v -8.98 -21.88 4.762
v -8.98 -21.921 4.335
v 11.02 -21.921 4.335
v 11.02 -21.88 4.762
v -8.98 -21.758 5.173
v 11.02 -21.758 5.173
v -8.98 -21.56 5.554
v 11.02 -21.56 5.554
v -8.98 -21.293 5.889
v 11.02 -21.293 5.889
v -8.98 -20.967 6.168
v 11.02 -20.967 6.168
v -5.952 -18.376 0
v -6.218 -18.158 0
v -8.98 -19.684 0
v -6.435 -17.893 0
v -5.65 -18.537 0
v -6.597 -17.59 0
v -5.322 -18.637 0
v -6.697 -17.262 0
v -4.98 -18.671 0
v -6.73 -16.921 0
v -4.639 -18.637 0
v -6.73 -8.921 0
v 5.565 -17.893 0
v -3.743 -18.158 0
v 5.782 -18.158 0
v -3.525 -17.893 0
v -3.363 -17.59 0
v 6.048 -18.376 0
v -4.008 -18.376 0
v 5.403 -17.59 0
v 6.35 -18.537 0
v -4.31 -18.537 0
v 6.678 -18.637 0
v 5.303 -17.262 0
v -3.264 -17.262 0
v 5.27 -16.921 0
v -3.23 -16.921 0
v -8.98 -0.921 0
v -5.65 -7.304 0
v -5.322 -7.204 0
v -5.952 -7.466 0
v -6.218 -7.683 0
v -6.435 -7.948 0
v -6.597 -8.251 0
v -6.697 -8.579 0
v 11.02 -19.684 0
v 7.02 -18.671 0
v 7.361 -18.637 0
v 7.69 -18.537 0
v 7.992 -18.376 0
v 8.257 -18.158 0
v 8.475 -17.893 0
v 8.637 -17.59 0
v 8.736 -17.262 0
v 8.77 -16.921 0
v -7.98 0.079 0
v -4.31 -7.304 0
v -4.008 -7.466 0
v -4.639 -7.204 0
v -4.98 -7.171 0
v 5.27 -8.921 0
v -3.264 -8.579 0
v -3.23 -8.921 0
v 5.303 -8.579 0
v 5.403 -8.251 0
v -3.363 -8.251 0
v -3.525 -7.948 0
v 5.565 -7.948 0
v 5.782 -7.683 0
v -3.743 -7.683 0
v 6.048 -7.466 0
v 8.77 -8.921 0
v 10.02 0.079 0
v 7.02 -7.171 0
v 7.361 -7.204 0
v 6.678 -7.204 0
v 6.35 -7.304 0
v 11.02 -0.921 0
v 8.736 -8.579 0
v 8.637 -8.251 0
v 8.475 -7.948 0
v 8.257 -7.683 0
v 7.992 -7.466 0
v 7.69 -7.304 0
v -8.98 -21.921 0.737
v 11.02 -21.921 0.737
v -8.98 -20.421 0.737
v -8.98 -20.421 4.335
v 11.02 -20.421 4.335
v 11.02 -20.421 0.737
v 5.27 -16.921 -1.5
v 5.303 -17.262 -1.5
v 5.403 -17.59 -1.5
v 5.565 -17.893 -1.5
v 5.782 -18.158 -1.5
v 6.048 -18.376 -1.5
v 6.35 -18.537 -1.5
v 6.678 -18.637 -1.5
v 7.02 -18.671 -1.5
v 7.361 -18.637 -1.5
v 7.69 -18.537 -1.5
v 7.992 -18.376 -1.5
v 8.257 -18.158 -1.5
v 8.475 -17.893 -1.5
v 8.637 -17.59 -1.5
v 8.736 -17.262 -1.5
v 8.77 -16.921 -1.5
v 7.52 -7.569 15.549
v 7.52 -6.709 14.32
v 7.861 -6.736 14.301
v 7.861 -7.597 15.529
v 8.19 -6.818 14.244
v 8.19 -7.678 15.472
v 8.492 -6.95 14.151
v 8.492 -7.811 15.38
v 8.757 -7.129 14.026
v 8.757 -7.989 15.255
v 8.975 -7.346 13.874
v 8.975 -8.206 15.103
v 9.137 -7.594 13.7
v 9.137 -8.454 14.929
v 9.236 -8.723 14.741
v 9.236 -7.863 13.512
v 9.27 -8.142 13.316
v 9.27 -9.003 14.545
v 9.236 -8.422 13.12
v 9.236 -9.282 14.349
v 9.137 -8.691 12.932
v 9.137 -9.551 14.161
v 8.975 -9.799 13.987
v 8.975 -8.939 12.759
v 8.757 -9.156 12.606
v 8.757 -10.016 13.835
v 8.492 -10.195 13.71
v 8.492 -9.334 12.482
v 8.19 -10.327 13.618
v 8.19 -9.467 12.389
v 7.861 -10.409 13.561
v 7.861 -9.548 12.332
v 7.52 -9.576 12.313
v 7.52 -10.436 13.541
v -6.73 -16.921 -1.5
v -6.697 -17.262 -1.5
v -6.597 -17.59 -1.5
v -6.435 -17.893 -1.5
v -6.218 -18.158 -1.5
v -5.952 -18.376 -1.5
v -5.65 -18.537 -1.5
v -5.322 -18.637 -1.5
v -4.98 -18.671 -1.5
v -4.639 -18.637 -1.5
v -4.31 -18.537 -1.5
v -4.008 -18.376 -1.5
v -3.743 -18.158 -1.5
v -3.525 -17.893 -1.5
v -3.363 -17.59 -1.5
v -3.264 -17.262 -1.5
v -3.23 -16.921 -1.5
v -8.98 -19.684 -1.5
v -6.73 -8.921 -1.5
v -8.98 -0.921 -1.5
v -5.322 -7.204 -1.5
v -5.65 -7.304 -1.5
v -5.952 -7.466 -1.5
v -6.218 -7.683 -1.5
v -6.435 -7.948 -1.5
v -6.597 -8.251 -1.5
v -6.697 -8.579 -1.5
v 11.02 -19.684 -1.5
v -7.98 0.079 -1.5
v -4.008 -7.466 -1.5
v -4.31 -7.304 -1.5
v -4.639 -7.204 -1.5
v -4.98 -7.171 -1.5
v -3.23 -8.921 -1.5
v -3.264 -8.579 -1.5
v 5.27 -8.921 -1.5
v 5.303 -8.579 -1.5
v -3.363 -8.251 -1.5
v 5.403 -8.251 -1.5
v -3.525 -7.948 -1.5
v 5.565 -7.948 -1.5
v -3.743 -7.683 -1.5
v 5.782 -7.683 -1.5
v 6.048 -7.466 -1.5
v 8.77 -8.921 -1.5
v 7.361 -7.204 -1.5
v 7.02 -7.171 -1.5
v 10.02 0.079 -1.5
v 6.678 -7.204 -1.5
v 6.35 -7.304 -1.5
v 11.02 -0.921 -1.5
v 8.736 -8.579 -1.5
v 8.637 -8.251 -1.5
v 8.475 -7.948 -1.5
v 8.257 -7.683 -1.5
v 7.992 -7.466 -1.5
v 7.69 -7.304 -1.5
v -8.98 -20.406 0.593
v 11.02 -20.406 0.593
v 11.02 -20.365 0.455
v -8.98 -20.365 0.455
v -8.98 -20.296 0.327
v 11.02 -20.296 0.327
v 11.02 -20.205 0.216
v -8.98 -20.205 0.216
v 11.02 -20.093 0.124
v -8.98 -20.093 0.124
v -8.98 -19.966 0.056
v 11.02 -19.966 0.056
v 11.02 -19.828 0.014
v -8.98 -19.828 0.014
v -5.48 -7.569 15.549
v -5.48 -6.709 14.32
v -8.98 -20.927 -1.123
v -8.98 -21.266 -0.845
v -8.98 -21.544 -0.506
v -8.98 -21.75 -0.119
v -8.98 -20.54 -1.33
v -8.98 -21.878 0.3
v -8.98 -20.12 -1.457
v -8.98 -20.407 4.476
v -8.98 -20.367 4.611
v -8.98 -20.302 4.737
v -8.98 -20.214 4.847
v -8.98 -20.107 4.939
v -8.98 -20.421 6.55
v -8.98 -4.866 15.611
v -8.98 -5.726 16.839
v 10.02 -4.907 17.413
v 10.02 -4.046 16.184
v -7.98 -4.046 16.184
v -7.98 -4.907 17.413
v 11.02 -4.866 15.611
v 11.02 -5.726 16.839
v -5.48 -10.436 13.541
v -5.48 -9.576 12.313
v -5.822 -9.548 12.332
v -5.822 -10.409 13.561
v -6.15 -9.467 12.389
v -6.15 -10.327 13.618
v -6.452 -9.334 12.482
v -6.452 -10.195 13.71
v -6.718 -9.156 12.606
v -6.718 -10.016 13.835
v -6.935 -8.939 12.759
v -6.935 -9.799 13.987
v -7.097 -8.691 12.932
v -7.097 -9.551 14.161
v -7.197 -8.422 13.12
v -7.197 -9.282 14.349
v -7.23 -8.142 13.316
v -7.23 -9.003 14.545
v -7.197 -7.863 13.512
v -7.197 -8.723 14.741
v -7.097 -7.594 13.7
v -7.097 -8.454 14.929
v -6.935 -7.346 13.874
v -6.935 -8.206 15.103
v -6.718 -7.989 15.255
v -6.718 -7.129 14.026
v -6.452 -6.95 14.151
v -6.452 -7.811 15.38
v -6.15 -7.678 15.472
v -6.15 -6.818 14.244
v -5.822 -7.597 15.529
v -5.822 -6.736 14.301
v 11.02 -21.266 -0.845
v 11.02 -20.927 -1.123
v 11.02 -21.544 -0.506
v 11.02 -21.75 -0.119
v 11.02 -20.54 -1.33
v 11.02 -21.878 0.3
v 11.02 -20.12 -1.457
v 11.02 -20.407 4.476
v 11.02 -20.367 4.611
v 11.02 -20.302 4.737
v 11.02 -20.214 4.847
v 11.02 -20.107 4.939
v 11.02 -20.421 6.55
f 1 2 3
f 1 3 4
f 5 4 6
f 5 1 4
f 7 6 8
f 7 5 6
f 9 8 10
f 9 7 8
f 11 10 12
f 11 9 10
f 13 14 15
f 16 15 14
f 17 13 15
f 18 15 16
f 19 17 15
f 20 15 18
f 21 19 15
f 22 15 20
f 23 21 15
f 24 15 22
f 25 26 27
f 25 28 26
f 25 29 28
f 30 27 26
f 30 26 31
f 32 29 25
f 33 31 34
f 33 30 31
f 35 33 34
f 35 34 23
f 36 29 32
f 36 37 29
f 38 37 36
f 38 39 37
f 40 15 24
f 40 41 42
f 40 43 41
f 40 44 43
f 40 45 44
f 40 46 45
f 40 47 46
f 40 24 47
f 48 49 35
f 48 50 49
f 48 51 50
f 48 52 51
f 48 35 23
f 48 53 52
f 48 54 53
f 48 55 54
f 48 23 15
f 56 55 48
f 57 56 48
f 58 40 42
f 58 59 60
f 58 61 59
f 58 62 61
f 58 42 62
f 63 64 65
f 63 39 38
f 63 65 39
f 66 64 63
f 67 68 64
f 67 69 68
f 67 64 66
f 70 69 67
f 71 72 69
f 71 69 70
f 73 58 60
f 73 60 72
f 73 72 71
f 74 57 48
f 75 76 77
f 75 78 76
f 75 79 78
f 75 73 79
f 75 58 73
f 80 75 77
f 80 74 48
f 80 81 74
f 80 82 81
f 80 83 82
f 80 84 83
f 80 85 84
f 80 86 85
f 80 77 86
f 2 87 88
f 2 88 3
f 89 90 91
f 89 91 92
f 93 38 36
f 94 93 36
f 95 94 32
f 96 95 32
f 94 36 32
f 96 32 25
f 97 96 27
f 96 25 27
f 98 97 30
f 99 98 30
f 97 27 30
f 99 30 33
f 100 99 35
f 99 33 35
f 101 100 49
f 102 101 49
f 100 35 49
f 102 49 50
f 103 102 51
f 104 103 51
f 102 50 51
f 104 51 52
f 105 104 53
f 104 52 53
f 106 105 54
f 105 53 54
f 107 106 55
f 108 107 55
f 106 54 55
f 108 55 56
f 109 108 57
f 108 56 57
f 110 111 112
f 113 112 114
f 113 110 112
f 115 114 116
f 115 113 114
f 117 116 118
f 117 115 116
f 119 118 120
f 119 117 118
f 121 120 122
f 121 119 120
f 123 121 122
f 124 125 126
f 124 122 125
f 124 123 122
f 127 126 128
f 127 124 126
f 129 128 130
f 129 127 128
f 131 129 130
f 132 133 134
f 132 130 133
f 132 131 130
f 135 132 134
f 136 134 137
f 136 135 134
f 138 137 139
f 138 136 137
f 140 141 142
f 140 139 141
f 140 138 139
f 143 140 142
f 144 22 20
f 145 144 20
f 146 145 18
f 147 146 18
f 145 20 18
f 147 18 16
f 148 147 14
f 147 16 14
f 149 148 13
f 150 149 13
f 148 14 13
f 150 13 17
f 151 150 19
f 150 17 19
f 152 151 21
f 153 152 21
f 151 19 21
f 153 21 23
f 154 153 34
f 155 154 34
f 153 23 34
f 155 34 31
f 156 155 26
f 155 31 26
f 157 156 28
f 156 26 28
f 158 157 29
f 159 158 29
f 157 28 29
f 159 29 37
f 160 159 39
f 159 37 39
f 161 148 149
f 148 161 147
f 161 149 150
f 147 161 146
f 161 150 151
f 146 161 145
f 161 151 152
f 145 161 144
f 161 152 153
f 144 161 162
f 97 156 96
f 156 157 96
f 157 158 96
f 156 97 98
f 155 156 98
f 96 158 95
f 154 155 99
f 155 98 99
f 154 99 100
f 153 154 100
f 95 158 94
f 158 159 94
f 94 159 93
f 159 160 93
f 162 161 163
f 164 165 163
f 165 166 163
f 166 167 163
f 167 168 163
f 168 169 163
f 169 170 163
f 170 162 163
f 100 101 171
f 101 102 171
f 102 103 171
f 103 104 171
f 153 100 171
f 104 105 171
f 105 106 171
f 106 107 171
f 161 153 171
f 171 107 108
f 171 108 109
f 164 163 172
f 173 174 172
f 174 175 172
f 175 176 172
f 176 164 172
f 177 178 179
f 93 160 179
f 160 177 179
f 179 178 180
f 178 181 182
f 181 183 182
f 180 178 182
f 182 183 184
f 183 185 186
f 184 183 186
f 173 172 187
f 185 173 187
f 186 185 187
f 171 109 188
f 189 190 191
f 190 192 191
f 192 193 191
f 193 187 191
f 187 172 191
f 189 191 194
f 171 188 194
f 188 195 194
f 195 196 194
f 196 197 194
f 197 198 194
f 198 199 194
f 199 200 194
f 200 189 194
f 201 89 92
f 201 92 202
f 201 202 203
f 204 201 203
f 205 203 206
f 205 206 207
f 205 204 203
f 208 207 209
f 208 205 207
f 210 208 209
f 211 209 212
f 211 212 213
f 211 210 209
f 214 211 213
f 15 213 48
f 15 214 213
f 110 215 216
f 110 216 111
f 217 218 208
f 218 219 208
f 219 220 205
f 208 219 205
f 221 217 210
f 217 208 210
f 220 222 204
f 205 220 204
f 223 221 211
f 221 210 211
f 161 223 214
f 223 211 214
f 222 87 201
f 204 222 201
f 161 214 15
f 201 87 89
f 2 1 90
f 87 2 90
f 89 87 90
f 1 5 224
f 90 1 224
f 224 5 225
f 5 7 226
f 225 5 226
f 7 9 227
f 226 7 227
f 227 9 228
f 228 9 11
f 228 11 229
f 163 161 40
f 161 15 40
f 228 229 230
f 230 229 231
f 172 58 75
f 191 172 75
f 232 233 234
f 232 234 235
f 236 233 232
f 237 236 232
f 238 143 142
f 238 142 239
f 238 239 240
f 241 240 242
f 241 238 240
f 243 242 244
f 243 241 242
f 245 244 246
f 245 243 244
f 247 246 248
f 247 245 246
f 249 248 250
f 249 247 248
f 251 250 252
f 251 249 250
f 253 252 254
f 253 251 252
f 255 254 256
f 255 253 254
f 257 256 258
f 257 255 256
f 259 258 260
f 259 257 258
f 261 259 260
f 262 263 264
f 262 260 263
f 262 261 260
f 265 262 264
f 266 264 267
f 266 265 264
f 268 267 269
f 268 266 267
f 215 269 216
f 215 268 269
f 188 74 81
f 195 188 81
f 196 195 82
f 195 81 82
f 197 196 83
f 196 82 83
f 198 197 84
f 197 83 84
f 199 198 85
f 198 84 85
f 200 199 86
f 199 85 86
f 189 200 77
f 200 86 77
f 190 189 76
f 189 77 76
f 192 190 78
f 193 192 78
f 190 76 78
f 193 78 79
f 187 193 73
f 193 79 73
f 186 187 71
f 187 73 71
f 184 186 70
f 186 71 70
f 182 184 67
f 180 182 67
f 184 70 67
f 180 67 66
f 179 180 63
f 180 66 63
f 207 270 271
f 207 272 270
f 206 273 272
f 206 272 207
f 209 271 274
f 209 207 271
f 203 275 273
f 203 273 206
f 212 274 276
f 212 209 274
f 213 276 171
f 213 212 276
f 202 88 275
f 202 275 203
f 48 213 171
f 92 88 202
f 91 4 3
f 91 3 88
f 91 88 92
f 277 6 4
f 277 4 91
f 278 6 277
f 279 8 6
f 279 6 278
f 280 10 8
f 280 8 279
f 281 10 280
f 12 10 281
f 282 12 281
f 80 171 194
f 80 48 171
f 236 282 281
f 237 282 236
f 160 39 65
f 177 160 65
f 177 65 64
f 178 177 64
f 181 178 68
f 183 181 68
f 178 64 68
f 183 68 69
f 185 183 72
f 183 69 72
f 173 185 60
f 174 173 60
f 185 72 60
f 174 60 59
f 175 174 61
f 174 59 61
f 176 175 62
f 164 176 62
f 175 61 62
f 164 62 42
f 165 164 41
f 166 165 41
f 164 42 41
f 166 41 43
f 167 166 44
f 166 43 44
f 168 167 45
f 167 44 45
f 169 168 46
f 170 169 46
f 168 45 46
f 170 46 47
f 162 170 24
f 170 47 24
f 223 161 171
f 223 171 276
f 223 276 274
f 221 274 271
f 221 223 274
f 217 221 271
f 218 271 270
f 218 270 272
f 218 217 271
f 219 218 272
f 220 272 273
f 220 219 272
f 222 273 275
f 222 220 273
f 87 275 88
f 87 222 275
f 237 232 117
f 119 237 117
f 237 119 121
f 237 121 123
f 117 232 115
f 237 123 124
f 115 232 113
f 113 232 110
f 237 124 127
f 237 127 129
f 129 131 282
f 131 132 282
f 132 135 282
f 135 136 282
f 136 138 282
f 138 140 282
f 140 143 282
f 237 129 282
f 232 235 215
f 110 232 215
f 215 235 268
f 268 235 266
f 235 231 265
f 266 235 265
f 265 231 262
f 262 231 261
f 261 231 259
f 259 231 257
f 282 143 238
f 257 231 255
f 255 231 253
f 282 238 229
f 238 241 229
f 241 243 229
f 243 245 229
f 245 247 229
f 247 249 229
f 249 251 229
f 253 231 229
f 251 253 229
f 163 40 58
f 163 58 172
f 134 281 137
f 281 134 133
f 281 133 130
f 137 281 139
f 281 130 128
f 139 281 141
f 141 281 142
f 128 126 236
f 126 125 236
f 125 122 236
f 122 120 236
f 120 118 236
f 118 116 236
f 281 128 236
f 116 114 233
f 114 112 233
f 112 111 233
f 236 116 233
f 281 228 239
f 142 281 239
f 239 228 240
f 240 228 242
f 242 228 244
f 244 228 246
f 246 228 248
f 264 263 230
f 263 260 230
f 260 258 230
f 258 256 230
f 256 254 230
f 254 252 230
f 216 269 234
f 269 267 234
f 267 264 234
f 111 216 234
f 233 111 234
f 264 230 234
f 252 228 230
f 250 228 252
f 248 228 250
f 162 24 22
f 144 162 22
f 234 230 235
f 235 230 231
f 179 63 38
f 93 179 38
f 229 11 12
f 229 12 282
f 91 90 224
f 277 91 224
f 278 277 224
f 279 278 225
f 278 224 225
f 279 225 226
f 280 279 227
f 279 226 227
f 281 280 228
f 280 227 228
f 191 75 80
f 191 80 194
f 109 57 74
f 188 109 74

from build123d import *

# Parameters (mm, degrees)
SKETCH1_W                    = 20
SKETCH1_H                    = 22
BASE_FLANGE1_DEPTH           = 1.5
EDGE_FLANGE1_STRIP_W         = 7.4732
EDGE_FLANGE1_STRIP_H         = 1.5
EDGE_FLANGE1_STRIP_CUT_DEPTH = 20
EDGE_FLANGE1_DEPTH           = 20
EDGE_FLANGE2_START           = -8.98015873
EDGE_FLANGE2_DEPTH           = 20
EDGE_FLANGE2_2_DEPTH         = 20
CUT_EXTRUDE1_DEPTH           = 10
CHAMFER1_SIZE                = 1
CHAMFER2_SIZE                = 1


# Read off the part's stored shape, not the designer's step: Edge-Flange2
# Sheet-metal steps are written as plain solids
with BuildPart() as part:
    # Sketch1 → Base-Flange1 (new body)
    with BuildSketch(Plane.XY):
        with Locations((1.01984127, -10.920634921)):
            Rectangle(SKETCH1_W, SKETCH1_H)
        with BuildLine():
            Line((-6.73015873, -8.920634921), (-6.73015873, -16.920634921))
            ThreePointArc((-6.73015873, -16.920634921), (-4.98015873, -18.670634921), (-3.23015873, -16.920634921))
            Line((-3.23015873, -16.920634921), (-3.23015873, -8.920634921))
            ThreePointArc((-3.23015873, -8.920634921), (-4.98015873, -7.170634921), (-6.73015873, -8.920634921))
        make_face(mode=Mode.SUBTRACT)
        with BuildLine():
            Line((5.26984127, -8.920634921), (5.26984127, -16.920634921))
            ThreePointArc((5.26984127, -16.920634921), (7.01984127, -18.670634921), (8.76984127, -16.920634921))
            Line((8.76984127, -16.920634921), (8.76984127, -8.920634921))
            ThreePointArc((8.76984127, -8.920634921), (7.01984127, -7.170634921), (5.26984127, -8.920634921))
        make_face(mode=Mode.SUBTRACT)
    extrude(amount=-BASE_FLANGE1_DEPTH)

    # Edge-Flange1 strip (across the edge) → Edge-Flange1 strip cut (cut)
    with BuildSketch(Plane(origin=(-8.98015873, -21.920634921, 0), x_dir=(0, 1, 0), z_dir=(1, 0, 0))):
        with Locations((-1.5, -0.75)):
            Rectangle(EDGE_FLANGE1_STRIP_W, EDGE_FLANGE1_STRIP_H)
    extrude(amount=EDGE_FLANGE1_STRIP_CUT_DEPTH, mode=Mode.SUBTRACT)

    # Edge-Flange1 section (across the edge) → Edge-Flange1 (add)
    with BuildSketch(Plane(origin=(-8.98015873, -21.920634921, 0), x_dir=(0, 1, 0), z_dir=(1, 0, 0))):
        with BuildLine():
            Line((0, 0.7366), (0, 6.55))
            Line((0, 6.55), (1.5, 6.55))
            Line((1.5, 6.55), (1.5, 0.7366))
            ThreePointArc((1.5, 0.7366), (1.715745145, 0.215745145), (2.2366, 0))
            Line((2.2366, 0), (2.2366, -1.5))
            ThreePointArc((2.2366, -1.5), (0.655084973, -0.844915027), (0, 0.7366))
        make_face()
    extrude(amount=EDGE_FLANGE1_DEPTH)

    # Edge-Flange2 outline → Edge-Flange2 (cut)
    with BuildSketch(Plane.YZ.offset(EDGE_FLANGE2_START)):
        with BuildLine():
            ThreePointArc((-21.920634921, 4.335388427), (-21.66792335, 5.368135376), (-20.966895978, 6.16750389))
            Line((-20.966895978, 6.16750389), (-20.420634921, 6.55))
            Line((-20.420634921, 6.55), (-21.920634921, 6.55))
            Line((-21.920634921, 6.55), (-21.920634921, 4.335388427))
        make_face()
    extrude(amount=EDGE_FLANGE2_DEPTH, mode=Mode.SUBTRACT)

    # Edge-Flange2 2 outline → Edge-Flange2 2 (add)
    with BuildSketch(Plane.YZ.offset(EDGE_FLANGE2_START)):
        with BuildLine():
            Line((-4.906846961, 17.412871276), (-20.420634921, 6.55))
            Line((-20.420634921, 6.55), (-20.420634921, 4.335388427))
            ThreePointArc((-20.420634921, 4.335388427), (-20.3374071, 4.675512455), (-20.106531324, 4.938775823))
            Line((-20.106531324, 4.938775823), (-4.046482306, 16.184143209))
            Line((-4.046482306, 16.184143209), (-4.906846961, 17.412871276))
        make_face()
    extrude(amount=EDGE_FLANGE2_2_DEPTH)

    # Sketch12 → Cut-Extrude1 (cut)
    with BuildSketch(Plane(origin=(0, -9.795676552, 13.989675943), x_dir=(1, 0, 0), z_dir=(0, -0.5735764363510533, 0.8191520442889869))):
        with BuildLine():
            Line((7.51984127, -0.781841066), (-5.48015873, -0.781841066))
            ThreePointArc((-5.48015873, -0.781841066), (-7.23015873, 0.968158934), (-5.48015873, 2.718158934))
            Line((-5.48015873, 2.718158934), (7.51984127, 2.718158934))
            ThreePointArc((7.51984127, 2.718158934), (9.26984127, 0.968158934), (7.51984127, -0.781841066))
        make_face()
    extrude(amount=-CUT_EXTRUDE1_DEPTH, mode=Mode.SUBTRACT)

    # Chamfer1
    chamfer1_edges = [part.edges().sort_by_distance(p)[0] for p in [
        (11.01984127, 0.079365079, -0.75),
    ]]
    chamfer(chamfer1_edges, length=CHAMFER1_SIZE)

    # Chamfer2
    chamfer2_edges = [part.edges().sort_by_distance(p)[0] for p in [
        (-8.98015873, 0.079365079, -0.75),
        (-8.98015873, -4.476664634, 16.798507243),
        (11.01984127, -4.476664634, 16.798507243),
    ]]
    chamfer(chamfer2_edges, length=CHAMFER2_SIZE)


solid = part.part
